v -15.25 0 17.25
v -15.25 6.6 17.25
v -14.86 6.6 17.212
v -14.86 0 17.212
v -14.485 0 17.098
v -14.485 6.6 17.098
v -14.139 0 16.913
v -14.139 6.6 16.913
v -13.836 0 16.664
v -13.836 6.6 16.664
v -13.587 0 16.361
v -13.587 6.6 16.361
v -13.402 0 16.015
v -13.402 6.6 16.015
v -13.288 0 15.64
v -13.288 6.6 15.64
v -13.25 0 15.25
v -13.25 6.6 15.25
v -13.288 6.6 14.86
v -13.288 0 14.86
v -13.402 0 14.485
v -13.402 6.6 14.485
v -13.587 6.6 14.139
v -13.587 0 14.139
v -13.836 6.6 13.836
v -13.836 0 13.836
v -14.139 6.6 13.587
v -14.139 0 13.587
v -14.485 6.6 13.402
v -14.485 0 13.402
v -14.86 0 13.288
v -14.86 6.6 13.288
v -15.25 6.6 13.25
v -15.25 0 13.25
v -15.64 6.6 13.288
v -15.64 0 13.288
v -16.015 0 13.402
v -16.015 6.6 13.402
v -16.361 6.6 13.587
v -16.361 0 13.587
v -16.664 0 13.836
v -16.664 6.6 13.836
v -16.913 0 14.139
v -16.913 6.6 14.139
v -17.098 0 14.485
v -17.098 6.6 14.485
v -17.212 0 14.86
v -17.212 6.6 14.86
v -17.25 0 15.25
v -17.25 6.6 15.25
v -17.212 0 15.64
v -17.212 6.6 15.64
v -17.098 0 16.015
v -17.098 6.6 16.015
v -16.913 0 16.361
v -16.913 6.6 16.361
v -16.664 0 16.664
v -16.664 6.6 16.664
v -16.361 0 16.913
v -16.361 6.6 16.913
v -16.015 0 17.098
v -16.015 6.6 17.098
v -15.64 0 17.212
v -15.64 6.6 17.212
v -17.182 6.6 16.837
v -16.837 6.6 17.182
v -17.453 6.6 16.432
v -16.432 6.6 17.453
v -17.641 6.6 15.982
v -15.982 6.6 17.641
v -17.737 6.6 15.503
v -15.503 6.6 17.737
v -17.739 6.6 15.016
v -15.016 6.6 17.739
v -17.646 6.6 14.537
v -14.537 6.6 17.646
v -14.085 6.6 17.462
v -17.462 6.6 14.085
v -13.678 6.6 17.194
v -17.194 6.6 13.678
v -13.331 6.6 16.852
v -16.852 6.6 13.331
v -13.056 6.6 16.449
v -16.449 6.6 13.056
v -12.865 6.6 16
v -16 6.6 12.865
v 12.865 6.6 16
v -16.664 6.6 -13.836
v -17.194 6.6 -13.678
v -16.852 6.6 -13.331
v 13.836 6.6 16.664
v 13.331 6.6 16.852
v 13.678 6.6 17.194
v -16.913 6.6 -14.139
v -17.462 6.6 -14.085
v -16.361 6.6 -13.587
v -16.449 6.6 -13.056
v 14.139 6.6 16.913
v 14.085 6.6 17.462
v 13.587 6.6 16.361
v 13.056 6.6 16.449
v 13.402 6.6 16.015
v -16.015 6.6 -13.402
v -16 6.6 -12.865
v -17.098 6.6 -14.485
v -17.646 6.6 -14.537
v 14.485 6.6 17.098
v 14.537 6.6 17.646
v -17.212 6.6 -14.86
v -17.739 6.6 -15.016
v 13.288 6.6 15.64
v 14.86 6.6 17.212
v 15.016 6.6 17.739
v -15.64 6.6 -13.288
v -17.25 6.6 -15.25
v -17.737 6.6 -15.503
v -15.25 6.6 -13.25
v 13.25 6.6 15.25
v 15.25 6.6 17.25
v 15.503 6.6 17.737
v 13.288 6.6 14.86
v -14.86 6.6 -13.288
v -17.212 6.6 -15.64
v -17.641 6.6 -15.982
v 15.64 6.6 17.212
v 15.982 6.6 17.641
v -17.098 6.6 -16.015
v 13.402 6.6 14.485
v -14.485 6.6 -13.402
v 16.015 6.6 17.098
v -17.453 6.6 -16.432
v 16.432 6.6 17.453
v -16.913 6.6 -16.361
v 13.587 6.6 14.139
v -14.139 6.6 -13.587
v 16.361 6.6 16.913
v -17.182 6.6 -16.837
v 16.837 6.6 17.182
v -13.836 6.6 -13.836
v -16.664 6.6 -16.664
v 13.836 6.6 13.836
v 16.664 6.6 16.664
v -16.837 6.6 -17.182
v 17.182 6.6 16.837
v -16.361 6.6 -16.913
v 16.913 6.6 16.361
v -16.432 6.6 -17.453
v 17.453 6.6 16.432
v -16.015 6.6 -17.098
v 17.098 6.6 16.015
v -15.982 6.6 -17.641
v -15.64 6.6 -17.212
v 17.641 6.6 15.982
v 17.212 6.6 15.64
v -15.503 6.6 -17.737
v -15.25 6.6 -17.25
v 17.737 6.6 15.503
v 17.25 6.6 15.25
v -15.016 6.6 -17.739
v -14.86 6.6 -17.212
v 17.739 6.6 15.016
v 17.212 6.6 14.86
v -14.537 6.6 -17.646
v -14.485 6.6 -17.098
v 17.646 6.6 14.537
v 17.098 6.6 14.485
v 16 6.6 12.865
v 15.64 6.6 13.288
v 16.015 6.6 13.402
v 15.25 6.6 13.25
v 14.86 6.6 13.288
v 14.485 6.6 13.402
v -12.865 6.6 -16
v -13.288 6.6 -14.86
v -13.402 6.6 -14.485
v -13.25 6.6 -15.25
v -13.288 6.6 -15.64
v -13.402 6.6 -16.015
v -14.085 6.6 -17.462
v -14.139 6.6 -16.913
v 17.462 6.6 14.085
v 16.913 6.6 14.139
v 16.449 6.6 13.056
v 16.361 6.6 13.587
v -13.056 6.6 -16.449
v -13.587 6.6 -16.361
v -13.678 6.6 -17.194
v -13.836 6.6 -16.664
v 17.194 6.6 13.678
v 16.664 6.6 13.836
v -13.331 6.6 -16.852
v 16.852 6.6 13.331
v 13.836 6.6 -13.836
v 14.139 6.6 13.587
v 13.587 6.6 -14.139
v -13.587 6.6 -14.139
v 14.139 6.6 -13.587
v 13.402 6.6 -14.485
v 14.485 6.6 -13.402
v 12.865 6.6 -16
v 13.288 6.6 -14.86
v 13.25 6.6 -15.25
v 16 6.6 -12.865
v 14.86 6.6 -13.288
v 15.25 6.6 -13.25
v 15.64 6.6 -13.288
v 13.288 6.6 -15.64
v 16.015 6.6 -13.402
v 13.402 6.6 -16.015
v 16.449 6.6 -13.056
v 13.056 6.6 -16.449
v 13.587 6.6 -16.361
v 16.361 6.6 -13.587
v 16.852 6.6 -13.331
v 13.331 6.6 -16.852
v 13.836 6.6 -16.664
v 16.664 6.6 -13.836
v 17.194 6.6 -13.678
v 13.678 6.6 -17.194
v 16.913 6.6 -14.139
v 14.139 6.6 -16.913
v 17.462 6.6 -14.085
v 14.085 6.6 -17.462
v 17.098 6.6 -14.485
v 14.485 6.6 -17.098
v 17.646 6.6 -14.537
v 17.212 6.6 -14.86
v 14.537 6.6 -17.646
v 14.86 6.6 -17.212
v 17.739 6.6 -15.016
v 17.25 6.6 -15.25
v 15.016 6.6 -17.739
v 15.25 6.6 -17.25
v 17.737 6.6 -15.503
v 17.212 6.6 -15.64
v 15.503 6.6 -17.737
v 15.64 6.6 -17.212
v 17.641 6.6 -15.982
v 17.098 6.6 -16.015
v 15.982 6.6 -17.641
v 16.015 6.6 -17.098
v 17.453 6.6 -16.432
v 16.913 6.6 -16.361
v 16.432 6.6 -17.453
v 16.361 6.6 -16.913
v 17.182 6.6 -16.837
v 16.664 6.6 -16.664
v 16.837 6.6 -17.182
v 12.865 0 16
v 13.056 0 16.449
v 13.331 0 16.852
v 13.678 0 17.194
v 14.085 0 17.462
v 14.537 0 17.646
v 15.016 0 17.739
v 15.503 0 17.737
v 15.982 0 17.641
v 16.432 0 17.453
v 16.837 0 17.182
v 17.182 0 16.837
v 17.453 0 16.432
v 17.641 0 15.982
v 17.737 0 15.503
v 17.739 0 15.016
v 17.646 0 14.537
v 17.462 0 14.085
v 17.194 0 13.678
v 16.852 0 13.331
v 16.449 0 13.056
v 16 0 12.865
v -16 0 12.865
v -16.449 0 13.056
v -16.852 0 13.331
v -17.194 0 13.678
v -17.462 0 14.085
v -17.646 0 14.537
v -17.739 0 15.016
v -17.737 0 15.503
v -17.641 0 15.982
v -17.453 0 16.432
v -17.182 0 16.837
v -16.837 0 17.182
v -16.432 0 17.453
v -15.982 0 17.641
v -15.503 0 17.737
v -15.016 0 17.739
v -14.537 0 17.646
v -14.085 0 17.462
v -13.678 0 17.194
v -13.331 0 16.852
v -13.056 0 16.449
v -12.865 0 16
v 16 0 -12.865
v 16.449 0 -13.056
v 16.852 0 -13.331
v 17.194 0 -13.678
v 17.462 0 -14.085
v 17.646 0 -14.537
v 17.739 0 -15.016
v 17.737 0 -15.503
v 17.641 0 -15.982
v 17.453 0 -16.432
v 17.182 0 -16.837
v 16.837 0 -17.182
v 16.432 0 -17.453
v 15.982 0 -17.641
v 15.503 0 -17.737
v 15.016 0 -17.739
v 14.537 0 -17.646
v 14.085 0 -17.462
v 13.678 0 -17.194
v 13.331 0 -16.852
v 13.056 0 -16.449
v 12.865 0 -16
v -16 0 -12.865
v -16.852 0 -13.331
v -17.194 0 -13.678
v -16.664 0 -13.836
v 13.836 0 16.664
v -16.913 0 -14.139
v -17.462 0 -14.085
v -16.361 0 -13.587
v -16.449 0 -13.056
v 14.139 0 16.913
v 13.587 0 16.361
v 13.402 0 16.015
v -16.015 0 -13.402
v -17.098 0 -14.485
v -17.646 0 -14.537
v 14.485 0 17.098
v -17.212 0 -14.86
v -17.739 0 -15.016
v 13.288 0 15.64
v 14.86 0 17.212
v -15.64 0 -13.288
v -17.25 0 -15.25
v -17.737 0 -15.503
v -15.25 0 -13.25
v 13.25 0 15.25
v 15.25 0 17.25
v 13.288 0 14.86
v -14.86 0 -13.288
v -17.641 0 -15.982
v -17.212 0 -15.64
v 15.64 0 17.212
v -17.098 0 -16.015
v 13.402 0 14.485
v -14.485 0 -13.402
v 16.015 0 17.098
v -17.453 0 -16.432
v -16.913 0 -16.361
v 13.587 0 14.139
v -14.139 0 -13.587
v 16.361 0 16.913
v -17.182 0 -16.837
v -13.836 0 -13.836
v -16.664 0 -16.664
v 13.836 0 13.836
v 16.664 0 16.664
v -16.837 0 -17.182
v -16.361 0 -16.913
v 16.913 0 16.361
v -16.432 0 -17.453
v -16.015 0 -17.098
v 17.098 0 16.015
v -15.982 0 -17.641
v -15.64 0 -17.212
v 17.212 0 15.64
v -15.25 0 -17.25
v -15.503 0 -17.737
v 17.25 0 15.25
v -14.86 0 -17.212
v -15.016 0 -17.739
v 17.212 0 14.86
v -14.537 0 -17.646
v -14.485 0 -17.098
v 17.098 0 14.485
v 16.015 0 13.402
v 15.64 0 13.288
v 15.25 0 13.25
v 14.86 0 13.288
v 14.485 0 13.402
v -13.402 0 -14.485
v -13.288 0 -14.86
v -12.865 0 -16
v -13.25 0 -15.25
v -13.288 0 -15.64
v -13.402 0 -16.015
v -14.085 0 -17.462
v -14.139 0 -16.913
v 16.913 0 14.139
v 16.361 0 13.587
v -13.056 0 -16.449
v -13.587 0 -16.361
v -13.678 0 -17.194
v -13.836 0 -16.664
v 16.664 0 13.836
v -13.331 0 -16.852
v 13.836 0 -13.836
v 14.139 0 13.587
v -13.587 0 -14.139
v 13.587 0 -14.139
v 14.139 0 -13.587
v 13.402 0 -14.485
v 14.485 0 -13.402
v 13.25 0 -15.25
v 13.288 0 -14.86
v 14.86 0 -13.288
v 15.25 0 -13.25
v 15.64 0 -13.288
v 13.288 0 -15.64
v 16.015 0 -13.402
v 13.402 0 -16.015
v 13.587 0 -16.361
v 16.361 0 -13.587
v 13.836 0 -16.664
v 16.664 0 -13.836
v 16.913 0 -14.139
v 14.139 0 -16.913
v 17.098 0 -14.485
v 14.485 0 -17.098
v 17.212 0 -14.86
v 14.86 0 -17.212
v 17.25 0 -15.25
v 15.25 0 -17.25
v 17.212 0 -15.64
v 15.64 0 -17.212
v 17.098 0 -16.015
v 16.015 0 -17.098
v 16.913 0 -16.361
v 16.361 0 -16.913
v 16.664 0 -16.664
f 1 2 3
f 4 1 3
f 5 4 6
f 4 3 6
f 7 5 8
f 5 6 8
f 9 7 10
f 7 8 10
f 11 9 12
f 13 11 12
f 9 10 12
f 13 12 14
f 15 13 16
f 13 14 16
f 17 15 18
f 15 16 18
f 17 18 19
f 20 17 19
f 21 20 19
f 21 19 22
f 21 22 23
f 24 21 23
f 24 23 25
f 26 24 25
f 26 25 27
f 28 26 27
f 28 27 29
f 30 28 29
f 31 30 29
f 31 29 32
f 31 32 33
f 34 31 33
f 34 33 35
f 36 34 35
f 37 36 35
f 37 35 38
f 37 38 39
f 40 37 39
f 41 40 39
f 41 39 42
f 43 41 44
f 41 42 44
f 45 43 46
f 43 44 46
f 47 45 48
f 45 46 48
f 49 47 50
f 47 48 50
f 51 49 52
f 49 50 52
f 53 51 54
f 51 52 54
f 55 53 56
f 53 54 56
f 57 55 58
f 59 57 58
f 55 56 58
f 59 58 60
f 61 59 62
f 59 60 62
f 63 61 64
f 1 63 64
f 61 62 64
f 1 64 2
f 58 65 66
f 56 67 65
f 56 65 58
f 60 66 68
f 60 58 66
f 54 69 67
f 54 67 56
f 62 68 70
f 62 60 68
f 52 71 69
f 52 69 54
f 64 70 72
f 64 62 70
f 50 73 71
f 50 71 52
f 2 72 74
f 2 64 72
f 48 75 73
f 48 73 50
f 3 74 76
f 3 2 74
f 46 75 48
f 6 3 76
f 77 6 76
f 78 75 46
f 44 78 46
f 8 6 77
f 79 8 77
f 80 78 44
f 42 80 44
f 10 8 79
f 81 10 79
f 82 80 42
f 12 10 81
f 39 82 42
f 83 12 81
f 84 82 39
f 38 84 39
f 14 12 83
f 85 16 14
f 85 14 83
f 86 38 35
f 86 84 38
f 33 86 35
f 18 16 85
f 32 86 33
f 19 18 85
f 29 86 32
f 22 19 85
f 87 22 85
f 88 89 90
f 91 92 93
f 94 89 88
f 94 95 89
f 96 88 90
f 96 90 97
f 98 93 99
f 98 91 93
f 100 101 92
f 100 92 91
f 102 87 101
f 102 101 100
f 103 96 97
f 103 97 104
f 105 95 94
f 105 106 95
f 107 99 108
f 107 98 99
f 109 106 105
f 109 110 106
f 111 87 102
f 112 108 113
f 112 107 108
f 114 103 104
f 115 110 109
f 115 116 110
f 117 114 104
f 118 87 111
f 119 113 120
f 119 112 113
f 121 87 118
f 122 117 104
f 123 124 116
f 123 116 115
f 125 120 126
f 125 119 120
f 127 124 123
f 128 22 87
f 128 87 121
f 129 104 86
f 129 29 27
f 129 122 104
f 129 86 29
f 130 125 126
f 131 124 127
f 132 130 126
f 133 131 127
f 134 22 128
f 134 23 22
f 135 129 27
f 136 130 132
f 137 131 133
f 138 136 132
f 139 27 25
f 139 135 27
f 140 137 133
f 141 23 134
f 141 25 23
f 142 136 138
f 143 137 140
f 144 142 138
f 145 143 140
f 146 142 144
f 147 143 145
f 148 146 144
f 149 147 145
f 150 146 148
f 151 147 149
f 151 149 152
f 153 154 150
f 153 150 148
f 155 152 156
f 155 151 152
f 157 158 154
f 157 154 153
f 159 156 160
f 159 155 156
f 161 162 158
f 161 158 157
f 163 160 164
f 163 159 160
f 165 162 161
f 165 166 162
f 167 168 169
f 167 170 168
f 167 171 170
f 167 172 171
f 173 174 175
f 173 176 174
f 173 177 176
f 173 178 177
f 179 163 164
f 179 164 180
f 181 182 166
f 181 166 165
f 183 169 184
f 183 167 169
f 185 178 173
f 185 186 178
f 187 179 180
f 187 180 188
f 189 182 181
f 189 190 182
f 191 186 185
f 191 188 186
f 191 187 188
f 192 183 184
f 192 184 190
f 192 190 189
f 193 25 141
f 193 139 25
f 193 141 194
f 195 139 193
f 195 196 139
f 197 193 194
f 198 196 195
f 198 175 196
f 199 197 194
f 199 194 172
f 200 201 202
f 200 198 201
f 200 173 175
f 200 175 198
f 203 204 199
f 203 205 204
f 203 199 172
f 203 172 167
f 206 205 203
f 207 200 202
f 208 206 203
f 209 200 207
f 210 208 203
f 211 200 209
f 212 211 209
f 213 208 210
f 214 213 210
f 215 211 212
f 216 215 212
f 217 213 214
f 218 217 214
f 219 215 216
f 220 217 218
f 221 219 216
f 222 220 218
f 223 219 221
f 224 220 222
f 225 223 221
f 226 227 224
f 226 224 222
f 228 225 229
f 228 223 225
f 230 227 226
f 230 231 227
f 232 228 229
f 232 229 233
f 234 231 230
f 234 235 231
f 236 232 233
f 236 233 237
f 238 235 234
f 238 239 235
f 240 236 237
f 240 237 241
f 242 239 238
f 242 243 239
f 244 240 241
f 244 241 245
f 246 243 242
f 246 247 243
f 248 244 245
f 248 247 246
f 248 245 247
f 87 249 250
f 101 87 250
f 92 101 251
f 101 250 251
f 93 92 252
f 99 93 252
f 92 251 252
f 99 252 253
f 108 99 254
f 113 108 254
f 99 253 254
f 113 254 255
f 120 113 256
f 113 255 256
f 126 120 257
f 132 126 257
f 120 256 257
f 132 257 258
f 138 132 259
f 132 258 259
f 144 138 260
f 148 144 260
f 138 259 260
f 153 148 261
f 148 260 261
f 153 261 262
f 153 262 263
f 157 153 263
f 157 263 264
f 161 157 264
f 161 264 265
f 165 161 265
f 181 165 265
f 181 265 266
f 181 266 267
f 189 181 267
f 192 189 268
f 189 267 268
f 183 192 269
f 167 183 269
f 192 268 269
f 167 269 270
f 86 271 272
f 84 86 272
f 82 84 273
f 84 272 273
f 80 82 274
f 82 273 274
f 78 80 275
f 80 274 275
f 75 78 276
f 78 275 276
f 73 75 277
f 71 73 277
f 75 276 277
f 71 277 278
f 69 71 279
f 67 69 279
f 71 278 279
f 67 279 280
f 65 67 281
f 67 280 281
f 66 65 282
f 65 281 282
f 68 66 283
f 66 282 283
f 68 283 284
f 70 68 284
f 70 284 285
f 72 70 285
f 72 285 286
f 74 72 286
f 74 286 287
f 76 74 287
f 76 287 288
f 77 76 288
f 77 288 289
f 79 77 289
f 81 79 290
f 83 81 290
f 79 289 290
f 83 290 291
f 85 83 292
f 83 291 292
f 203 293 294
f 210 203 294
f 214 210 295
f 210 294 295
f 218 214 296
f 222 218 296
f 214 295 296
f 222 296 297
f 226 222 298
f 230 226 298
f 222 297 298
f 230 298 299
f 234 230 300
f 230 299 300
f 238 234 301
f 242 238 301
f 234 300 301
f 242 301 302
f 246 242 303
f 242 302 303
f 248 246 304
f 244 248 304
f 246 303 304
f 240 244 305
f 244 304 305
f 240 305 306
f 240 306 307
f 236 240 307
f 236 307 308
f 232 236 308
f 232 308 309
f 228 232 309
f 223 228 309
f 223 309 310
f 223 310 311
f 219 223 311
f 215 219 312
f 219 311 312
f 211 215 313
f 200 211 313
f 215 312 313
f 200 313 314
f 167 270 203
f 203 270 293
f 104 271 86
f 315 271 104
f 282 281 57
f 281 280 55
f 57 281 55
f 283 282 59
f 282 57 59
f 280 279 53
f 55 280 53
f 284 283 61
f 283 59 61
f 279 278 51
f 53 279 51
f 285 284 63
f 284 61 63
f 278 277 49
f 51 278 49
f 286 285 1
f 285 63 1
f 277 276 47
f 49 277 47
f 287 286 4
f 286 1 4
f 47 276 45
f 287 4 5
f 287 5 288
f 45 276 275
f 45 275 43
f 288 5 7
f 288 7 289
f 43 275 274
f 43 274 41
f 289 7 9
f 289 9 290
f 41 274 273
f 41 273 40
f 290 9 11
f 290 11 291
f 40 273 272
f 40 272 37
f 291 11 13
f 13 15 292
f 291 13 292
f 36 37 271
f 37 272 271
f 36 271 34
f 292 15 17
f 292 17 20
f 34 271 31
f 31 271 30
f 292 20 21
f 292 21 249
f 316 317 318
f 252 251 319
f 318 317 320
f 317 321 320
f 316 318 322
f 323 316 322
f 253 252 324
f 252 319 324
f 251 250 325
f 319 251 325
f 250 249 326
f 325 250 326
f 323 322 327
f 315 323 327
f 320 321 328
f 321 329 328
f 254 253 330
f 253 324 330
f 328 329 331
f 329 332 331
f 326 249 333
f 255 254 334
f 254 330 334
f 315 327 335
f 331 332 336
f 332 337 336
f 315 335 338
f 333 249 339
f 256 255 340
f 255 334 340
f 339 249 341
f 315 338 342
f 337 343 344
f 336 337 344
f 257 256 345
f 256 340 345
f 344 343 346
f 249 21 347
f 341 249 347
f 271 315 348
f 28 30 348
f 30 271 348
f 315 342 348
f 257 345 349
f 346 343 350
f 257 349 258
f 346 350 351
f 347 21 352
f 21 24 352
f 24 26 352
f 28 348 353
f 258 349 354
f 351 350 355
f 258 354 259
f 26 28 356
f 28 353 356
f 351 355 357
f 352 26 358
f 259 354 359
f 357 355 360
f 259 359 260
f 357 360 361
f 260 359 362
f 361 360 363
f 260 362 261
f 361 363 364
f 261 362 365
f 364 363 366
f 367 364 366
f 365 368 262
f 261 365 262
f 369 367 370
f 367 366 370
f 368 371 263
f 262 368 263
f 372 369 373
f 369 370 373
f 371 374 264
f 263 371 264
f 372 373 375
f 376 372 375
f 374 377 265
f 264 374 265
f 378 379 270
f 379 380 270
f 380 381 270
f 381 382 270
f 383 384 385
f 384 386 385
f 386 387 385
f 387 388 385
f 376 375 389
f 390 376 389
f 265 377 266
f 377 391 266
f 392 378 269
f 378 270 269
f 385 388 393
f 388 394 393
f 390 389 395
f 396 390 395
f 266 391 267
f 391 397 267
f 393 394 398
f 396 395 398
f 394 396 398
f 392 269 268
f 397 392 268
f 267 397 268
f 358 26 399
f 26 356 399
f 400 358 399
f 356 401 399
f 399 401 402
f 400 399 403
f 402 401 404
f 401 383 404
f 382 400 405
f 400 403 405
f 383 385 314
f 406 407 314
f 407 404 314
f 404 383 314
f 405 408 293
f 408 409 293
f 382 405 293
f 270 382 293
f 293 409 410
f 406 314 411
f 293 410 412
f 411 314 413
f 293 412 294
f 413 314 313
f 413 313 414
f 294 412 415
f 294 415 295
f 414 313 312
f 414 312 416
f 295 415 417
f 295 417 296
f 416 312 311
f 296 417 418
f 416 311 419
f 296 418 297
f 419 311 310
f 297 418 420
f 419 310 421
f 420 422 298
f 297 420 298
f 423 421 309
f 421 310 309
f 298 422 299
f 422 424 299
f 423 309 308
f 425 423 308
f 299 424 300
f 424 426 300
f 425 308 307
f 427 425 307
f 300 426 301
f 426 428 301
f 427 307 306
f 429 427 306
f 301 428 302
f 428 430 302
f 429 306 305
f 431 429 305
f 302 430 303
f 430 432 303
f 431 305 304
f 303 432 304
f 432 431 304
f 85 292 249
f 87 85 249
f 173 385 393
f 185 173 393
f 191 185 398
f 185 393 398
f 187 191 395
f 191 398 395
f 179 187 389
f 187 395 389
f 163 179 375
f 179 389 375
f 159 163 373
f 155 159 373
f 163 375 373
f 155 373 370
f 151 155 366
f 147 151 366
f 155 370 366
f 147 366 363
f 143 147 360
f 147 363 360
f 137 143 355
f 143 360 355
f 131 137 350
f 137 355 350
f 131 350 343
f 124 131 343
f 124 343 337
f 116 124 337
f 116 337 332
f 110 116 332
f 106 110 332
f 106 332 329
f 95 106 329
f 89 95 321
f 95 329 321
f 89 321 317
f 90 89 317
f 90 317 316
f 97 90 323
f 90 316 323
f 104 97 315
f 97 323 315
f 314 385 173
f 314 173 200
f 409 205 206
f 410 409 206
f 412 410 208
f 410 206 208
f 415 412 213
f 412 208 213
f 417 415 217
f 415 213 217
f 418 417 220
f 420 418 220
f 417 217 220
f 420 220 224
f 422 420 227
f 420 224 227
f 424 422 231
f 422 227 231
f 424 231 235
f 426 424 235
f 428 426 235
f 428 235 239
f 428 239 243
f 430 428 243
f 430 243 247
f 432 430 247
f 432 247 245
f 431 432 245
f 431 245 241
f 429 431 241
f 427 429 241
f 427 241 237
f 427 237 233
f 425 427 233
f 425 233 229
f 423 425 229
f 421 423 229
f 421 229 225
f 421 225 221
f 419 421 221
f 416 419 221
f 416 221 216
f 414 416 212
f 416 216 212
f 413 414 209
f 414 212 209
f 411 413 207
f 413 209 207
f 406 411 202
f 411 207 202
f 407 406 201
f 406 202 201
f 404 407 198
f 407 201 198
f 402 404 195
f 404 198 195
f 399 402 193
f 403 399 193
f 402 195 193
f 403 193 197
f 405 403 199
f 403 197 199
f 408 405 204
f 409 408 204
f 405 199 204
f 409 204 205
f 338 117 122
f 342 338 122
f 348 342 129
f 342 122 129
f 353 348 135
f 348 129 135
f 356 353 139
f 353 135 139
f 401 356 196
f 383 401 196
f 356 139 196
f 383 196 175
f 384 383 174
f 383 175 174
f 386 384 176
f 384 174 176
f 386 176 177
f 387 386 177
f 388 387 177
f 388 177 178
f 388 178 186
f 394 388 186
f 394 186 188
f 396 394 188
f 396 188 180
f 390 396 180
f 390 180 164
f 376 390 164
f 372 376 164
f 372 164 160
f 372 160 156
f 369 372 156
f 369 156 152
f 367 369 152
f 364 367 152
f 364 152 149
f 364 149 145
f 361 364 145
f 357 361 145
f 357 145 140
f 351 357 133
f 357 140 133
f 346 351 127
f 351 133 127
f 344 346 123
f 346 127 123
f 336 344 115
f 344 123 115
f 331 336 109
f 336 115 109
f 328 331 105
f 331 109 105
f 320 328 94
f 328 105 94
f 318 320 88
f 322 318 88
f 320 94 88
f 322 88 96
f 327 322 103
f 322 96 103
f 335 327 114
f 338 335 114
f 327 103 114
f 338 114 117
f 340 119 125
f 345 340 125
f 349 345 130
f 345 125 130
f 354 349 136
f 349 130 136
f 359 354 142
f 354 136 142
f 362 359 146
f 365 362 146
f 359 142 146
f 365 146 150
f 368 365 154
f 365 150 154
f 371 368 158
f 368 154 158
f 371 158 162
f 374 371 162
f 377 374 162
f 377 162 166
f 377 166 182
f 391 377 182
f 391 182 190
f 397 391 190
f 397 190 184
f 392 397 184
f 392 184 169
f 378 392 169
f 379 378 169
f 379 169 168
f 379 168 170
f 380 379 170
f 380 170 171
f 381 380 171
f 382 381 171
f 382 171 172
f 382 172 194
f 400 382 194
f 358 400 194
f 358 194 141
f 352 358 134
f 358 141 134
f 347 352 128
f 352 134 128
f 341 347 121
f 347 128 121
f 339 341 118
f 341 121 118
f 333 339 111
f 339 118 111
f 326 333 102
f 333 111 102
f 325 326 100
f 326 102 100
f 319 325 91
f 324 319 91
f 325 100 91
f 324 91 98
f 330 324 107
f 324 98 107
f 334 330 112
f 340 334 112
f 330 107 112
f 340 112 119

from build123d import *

# Parameters (mm, degrees)
SKETCH1_R           = 2.5
SKETCH1_W           = 32
SKETCH1_H           = 32
BOSS_EXTRUDE1_DEPTH = 6.6
SKETCH2_R           = 2
CUT_EXTRUDE1_DEPTH  = 10


with BuildPart() as part:
    # Sketch1 → Boss-Extrude1 (new body)
    with BuildSketch(Plane(origin=(0, 0, 0), x_dir=(1, 0, 0), z_dir=(0, 1, 0))):
        with Locations((-15.25, 15.25)):
            Circle(SKETCH1_R)
        with Locations((15.25, 15.25)):
            Circle(SKETCH1_R)
        with Locations((-15.25, -15.25)):
            Circle(SKETCH1_R)
        with Locations((15.25, -15.25)):
            Circle(SKETCH1_R)
        Rectangle(SKETCH1_W, SKETCH1_H)
    extrude(amount=BOSS_EXTRUDE1_DEPTH)

    # Sketch2 → Cut-Extrude1 (cut)
    with BuildSketch(Plane(origin=(0, 6.6, 0), x_dir=(1, 0, 0), z_dir=(0, 1, 0))):
        with Locations(Location((-15.25, 15.25, 0), (0, 0, 270))):
            Circle(SKETCH2_R)
        with Locations(Location((15.25, 15.25, 0), (0, 0, 270))):
            Circle(SKETCH2_R)
        with Locations(Location((15.25, -15.25, 0), (0, 0, 270))):
            Circle(SKETCH2_R)
        with Locations(Location((-15.25, -15.25, 0), (0, 0, 270))):
            Circle(SKETCH2_R)
    extrude(amount=-CUT_EXTRUDE1_DEPTH, mode=Mode.SUBTRACT)


solid = part.part
